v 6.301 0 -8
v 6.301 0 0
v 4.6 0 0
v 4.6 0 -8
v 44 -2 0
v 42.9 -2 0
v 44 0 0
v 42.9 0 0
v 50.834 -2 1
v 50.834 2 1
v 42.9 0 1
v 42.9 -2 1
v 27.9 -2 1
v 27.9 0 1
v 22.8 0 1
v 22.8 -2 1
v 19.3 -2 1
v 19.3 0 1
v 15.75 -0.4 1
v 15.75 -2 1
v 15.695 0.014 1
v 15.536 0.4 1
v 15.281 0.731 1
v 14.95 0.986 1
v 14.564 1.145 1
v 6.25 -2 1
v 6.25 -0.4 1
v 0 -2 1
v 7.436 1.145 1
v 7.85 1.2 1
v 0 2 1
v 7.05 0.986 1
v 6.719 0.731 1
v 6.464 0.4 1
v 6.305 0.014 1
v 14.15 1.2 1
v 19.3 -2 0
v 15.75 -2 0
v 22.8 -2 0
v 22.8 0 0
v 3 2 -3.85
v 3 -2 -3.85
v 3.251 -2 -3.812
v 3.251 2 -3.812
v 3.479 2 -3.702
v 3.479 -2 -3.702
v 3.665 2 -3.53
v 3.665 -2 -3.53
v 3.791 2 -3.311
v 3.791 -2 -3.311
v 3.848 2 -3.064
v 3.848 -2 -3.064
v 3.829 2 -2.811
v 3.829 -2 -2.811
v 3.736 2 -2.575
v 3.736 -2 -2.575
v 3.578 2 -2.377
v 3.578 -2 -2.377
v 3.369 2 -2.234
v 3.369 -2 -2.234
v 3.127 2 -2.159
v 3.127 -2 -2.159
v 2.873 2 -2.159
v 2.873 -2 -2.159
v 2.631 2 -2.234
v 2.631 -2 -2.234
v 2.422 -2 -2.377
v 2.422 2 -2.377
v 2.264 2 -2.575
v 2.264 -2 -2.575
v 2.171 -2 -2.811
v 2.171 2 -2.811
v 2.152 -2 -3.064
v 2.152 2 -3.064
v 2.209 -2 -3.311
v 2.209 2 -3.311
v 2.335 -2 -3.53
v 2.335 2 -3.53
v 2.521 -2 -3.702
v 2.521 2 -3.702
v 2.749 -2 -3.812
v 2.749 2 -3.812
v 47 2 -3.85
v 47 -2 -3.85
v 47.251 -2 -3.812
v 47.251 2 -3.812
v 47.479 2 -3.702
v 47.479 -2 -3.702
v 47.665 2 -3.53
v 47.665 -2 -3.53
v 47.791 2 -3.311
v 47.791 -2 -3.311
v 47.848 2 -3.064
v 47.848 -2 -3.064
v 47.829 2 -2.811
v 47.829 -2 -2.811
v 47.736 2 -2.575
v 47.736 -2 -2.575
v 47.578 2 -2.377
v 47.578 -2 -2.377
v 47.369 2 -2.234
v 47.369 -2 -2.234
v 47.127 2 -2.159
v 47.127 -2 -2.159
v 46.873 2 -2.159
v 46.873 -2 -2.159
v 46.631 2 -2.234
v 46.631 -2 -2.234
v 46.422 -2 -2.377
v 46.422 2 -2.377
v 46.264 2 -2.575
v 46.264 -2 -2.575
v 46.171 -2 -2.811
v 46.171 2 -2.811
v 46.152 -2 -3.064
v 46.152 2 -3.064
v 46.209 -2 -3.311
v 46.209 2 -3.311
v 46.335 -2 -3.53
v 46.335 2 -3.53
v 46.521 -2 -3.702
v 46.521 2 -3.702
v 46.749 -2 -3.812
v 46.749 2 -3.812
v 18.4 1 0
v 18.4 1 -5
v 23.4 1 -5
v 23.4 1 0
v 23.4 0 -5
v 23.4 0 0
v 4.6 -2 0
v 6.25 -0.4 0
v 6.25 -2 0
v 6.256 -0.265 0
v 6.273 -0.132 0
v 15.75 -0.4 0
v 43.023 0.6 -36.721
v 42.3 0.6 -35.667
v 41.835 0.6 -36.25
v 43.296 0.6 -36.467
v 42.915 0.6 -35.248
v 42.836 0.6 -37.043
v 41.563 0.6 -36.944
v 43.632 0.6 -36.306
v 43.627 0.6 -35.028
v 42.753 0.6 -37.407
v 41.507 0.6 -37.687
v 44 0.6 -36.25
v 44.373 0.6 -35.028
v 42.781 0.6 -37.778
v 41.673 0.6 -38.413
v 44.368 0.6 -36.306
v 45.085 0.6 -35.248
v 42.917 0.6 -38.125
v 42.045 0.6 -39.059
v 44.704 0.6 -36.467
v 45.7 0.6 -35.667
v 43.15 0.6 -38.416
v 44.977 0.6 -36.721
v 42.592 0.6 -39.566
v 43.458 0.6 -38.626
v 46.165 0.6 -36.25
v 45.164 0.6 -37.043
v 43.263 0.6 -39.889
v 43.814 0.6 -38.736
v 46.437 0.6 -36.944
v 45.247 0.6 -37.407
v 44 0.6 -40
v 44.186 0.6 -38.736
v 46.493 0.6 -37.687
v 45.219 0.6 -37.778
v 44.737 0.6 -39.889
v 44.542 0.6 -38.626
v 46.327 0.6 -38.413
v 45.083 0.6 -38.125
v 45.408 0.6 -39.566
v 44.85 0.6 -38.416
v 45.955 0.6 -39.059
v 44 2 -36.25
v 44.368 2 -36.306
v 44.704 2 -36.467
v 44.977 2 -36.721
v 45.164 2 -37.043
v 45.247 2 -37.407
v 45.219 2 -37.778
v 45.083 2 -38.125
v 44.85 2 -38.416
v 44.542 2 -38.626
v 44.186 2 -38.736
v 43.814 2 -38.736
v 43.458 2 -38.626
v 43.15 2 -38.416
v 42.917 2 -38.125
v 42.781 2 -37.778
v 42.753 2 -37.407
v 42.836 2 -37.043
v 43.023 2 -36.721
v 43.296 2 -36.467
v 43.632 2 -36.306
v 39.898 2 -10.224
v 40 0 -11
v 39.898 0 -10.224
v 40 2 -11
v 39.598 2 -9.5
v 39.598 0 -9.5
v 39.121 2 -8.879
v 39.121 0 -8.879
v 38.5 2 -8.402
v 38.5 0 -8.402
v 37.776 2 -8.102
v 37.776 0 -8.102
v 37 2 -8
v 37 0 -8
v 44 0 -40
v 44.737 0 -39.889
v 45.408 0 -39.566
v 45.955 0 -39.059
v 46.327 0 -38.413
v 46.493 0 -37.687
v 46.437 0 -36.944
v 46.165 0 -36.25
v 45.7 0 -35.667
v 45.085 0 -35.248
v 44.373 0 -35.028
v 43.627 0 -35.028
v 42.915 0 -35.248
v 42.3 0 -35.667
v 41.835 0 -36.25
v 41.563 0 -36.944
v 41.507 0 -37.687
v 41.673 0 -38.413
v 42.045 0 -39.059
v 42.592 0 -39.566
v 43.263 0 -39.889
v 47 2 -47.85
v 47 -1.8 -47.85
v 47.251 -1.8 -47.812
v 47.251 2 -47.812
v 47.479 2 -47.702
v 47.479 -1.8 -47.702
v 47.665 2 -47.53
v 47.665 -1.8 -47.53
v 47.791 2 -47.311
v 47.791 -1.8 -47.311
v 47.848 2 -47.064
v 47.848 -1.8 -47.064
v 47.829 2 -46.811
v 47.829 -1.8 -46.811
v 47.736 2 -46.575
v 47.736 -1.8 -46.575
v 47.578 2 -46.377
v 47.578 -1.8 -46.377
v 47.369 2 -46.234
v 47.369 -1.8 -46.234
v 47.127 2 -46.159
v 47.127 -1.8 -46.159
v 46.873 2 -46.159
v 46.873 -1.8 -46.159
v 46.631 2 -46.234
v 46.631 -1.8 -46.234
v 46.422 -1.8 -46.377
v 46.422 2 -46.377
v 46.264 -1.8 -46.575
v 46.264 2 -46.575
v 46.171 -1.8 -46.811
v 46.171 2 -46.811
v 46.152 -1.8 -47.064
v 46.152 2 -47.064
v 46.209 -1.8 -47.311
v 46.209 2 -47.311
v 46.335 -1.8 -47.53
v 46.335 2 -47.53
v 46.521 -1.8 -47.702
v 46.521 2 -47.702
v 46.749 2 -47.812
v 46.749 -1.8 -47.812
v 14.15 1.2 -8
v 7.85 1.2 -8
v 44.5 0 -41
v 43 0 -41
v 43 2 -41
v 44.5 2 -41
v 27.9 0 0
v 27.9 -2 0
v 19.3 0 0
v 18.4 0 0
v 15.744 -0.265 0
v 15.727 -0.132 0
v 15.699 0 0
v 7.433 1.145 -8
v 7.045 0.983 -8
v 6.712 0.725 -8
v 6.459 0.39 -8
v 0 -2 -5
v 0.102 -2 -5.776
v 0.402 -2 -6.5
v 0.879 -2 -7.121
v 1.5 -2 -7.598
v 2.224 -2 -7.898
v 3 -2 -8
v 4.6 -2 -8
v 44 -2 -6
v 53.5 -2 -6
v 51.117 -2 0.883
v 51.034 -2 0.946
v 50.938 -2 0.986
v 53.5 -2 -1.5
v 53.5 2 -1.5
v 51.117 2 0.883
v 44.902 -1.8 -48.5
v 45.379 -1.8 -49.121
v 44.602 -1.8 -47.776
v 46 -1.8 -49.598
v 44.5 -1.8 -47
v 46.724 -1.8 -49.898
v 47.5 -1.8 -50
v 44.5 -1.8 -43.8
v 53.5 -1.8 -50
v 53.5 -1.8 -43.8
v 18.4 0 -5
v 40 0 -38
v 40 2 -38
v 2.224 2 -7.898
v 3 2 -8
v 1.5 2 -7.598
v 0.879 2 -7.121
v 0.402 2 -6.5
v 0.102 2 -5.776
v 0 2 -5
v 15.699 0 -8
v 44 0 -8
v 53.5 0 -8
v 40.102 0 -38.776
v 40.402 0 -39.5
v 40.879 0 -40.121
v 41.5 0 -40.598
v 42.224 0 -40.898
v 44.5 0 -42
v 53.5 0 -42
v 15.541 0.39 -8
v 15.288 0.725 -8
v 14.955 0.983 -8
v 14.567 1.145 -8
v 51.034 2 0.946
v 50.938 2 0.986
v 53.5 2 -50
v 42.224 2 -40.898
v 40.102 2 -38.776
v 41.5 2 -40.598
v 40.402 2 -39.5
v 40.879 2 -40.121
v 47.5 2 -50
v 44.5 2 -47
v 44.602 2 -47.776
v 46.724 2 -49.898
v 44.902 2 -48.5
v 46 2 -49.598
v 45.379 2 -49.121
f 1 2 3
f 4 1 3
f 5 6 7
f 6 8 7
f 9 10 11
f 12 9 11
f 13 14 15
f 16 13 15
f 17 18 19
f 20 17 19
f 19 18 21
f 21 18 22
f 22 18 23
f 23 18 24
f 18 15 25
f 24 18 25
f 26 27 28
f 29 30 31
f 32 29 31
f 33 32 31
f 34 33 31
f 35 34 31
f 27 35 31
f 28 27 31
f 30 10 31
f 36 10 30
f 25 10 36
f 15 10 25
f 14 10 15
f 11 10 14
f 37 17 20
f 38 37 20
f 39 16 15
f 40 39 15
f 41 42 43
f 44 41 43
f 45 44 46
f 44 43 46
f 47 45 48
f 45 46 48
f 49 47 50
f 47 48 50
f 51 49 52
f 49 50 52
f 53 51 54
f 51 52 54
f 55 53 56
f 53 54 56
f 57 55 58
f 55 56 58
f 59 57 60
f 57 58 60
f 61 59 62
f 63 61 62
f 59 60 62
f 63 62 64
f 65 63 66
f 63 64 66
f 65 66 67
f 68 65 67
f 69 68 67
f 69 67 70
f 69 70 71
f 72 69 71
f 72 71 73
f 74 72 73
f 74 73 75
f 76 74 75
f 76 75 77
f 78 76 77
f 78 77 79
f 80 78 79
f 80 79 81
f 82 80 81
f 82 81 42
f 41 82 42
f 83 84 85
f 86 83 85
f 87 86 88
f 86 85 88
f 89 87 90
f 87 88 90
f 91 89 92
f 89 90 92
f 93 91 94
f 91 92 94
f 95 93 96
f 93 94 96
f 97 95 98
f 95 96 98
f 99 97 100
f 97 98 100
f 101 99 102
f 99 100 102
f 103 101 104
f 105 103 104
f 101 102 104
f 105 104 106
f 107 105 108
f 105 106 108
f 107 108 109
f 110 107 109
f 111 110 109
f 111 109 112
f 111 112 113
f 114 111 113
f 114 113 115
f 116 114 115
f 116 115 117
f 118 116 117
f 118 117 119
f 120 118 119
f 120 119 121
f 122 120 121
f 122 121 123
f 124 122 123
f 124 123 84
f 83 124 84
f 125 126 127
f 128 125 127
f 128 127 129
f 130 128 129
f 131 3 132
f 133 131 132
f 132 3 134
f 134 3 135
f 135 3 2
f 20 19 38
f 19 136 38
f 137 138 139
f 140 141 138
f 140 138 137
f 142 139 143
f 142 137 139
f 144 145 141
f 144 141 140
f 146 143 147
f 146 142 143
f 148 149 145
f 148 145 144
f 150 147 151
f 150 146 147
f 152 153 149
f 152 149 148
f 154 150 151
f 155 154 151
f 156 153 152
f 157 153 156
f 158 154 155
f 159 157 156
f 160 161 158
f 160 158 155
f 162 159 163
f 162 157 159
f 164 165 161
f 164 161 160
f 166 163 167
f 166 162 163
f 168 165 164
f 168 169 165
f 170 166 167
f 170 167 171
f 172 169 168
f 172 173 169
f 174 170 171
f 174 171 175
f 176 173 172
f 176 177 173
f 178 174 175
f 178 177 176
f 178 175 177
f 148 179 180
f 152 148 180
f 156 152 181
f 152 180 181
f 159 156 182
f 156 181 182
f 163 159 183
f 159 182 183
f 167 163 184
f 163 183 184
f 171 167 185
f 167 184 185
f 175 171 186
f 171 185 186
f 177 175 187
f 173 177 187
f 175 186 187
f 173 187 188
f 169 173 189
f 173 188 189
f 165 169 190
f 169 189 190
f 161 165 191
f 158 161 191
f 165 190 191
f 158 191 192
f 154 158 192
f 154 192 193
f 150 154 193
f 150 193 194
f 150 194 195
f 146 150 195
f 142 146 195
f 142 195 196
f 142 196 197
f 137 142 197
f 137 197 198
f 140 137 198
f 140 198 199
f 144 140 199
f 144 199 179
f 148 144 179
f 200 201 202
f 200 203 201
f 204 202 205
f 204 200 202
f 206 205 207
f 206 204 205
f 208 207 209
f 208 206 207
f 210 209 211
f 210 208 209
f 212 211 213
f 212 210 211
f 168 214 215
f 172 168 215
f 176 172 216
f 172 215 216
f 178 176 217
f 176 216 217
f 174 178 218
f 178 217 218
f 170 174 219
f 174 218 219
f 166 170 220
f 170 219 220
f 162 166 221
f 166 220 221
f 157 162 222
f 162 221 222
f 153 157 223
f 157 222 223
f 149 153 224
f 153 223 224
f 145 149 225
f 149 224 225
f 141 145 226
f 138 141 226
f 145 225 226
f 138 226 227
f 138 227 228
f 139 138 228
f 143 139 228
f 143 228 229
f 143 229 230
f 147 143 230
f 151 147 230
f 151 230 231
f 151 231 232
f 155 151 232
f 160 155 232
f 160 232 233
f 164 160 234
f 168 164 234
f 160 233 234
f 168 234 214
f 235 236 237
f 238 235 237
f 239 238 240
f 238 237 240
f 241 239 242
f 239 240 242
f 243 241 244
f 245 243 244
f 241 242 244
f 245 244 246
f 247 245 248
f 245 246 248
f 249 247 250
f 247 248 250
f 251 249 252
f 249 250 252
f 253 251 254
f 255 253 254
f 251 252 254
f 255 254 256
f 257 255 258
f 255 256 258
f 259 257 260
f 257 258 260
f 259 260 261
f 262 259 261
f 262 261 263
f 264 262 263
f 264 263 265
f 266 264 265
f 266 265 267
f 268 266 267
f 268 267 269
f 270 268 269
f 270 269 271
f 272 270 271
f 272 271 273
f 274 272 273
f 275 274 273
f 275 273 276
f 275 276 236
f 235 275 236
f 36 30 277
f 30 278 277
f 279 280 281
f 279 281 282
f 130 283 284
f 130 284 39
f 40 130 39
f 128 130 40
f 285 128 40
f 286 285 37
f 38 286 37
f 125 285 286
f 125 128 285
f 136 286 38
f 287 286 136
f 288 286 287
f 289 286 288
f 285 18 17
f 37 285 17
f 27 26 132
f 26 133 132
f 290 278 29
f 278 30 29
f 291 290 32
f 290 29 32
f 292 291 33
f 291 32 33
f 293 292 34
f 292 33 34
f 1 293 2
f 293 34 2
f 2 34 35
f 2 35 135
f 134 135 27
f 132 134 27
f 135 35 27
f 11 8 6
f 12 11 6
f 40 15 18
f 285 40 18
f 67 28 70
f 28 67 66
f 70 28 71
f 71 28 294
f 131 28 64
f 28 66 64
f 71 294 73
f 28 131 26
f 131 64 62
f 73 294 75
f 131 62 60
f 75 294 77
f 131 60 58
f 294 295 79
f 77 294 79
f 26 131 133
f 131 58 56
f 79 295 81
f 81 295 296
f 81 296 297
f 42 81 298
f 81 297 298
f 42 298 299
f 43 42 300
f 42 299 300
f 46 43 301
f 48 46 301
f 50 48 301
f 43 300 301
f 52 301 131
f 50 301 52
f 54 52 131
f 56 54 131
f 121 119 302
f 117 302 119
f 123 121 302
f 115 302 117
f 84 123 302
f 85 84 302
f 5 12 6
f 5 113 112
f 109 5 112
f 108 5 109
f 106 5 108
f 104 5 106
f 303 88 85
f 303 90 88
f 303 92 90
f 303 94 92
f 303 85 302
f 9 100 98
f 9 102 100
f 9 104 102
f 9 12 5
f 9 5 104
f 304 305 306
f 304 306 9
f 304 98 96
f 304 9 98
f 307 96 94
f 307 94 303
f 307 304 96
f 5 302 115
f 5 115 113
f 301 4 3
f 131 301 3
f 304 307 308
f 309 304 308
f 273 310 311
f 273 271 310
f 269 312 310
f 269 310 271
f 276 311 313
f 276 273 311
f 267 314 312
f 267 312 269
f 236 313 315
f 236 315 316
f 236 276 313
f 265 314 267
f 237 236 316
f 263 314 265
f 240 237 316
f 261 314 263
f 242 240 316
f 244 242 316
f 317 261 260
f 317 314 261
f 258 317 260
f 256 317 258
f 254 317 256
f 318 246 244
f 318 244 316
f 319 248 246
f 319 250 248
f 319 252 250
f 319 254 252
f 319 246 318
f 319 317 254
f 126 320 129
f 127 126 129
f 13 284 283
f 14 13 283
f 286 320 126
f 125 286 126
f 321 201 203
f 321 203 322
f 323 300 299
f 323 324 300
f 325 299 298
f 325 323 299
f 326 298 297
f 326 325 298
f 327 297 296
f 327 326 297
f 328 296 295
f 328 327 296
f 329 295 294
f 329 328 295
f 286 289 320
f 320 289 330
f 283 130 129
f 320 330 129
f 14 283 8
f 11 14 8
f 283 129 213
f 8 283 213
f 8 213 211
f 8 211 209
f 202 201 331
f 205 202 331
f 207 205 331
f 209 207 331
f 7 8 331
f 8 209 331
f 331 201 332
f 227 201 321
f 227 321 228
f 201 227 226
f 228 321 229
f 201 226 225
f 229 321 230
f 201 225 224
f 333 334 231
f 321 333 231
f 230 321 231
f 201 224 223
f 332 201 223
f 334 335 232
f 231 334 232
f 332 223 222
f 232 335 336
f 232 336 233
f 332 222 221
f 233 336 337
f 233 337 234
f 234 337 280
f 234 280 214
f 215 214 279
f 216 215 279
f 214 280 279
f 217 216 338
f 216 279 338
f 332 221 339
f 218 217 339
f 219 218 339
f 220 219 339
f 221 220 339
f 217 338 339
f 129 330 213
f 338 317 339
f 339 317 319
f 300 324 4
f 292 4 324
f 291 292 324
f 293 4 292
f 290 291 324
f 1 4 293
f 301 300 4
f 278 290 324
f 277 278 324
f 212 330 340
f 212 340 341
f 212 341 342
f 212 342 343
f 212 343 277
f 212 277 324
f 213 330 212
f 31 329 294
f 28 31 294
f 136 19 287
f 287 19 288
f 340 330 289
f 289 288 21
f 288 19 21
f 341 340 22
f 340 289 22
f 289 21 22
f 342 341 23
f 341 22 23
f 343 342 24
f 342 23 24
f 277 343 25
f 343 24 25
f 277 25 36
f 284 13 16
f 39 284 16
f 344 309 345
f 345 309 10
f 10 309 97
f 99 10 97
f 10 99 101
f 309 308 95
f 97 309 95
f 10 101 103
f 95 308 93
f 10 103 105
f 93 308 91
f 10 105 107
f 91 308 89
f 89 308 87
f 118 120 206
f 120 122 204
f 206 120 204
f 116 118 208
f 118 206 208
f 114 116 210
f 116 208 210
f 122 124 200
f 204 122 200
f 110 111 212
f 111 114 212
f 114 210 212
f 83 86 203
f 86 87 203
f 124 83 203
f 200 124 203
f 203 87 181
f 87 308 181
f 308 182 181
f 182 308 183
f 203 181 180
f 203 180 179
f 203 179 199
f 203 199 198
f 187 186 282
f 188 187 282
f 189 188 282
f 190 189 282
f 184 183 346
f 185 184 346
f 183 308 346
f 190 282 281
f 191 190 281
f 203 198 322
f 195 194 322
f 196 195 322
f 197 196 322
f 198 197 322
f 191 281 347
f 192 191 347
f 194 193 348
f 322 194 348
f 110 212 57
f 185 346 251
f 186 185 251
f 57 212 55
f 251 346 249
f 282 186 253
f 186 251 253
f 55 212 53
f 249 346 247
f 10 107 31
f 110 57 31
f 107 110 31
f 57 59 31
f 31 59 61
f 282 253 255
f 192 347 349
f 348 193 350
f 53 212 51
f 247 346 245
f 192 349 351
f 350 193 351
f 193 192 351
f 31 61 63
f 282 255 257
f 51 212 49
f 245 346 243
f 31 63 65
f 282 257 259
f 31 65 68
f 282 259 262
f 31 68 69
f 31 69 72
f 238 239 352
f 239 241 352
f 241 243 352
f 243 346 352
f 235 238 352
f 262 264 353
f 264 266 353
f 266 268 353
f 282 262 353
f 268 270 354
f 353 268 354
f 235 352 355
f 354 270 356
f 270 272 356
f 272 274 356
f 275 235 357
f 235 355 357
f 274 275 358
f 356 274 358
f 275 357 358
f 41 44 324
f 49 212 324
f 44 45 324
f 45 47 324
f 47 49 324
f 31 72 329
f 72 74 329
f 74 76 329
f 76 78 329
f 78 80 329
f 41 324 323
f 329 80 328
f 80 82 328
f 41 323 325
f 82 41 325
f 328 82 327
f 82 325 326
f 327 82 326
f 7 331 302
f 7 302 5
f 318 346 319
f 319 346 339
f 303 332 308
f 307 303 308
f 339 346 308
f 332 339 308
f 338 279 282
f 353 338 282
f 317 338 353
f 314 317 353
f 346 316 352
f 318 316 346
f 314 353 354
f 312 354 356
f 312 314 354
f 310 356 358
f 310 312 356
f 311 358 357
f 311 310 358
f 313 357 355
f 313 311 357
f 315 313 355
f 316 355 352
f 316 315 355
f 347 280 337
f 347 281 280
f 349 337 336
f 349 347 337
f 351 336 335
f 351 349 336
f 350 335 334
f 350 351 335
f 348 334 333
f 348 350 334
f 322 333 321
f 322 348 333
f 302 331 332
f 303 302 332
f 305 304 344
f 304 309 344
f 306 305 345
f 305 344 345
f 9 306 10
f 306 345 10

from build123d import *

# Parameters (mm, degrees)
EXTRUDE_1_DEPTH     = 2
SKETCH_3_W          = 9.5
SKETCH_3_H          = 8
CUT_EXTRUDE_1_DEPTH = 1.2
SKETCH_4_W          = 5
SKETCH_4_H          = 5
CUT_EXTRUDE_2_DEPTH = 1
EXTRUDE_2_DEPTH     = 1
FILLET_1_R          = 1.6
SKETCH_6_W          = 9.5
SKETCH_6_H          = 6
SKETCH_6_W_2        = 9
SKETCH_6_W_3        = 4.6
SKETCH_6_H_2        = 8
EXTRUDE_3_DEPTH     = 2
CHAMFER_1_SIZE      = 2.5
CHAMFER_2_SIZE      = 2
FILLET_2_R          = 3
SKETCH_7_R          = 0.85
CUT_EXTRUDE_3_DEPTH = 74.33655296
SKETCH_8_R          = 1.25
CUT_EXTRUDE_4_DEPTH = 74.33655296
SKETCH_9_R          = 2.5
CUT_EXTRUDE_5_DEPTH = 0.6
FILLET_3_R          = 0.4
SKETCH_10_W         = 12.125863774
SKETCH_10_H         = 8.335254798
CUT_EXTRUDE_6_DEPTH = 0.2
EXTRUDE_4_DEPTH     = 1


with BuildPart() as part:
    # 草图2 → 凸台-拉伸1 (new body)
    with BuildSketch(Plane(origin=(0, 0, 0), x_dir=(1, 0, 0), z_dir=(0, 1, 0))):
        Polygon((40, 41), (44.5, 41), (44.5, 50), (53.5, 50), (53.5, 0), (0, 0), (0, 8), (40, 8), align=None)
    extrude(amount=EXTRUDE_1_DEPTH)

    # 草图3 → 切除-拉伸1 (cut)
    with BuildSketch(Plane.XZ):
        with Locations((11, -4)):
            Rectangle(SKETCH_3_W, SKETCH_3_H)
    extrude(amount=-CUT_EXTRUDE_1_DEPTH, mode=Mode.SUBTRACT)

    # 草图4 → 切除-拉伸2 (cut)
    with BuildSketch(Plane.XZ):
        with Locations((20.9, -2.5)):
            Rectangle(SKETCH_4_W, SKETCH_4_H)
    extrude(amount=-CUT_EXTRUDE_2_DEPTH, mode=Mode.SUBTRACT)

    # 草图5 → 凸台-拉伸2 (add)
    with BuildSketch(Plane.XY):
        Polygon((0, 0), (0, -2), (6.25, -2), (6.25, 0), (6.25, 1.2), (15.75, 1.2), (15.75, -2), (18.4, -2), (18.4, 1), (23.4, 1), (23.4, 0), (23.4, -2), (27.9, -2), (27.9, 0), (42.9, 0), (42.9, -2), (53.5, -2), (53.5, 0), (53.5, 2), (0, 2), align=None)
    extrude(amount=EXTRUDE_2_DEPTH)

    # 圆角1
    fillet_1_edges = [part.edges().sort_by_distance(p)[0] for p in [
        (15.75, 1.2, -3.5),
        (6.25, 1.2, -3.5),
    ]]
    fillet(fillet_1_edges, radius=FILLET_1_R)

    # 草图6 → 凸台-拉伸3 (add)
    with BuildSketch(Plane.XZ):
        with Locations((48.75, -3)):
            Rectangle(SKETCH_6_W, SKETCH_6_H)
        with Locations((49, -47)):
            Rectangle(SKETCH_6_W_2, SKETCH_6_H)
        with Locations((2.3, -4)):
            Rectangle(SKETCH_6_W_3, SKETCH_6_H_2)
    extrude(amount=EXTRUDE_3_DEPTH)

    # 倒角1
    chamfer_1_edges = [part.edges().sort_by_distance(p)[0] for p in [
        (53.5, 0, 1),
    ]]
    chamfer(chamfer_1_edges, length=CHAMFER_1_SIZE)

    # 倒角2
    chamfer_2_edges = [part.edges().sort_by_distance(p)[0] for p in [
        (48.75, 0, -6),
        (49, 0, -44),
    ]]
    chamfer(chamfer_2_edges, length=CHAMFER_2_SIZE - 0.0001)  # a hair under: the kernel refuses the full size

    # 圆角2
    fillet_2_edges = [part.edges().sort_by_distance(p)[0] for p in [
        (0, 0, -8),
        (40, 1, -8),
        (40, 1, -41),
        (44.5, 0, -50),
    ]]
    fillet(fillet_2_edges, radius=FILLET_2_R)

    # 草图7 → 切除-拉伸3 (cut, through all)
    with BuildSketch(Plane.XZ.offset(2)):
        with Locations(Location((47, -3, 0), (0, 0, 270))):
            Circle(SKETCH_7_R)
        with Locations(Location((47, -47, 0), (0, 0, 270))):
            Circle(SKETCH_7_R)
        with Locations(Location((3, -3, 0), (0, 0, 270))):
            Circle(SKETCH_7_R)
    extrude(amount=-CUT_EXTRUDE_3_DEPTH, mode=Mode.SUBTRACT)

    # 草图8 → 切除-拉伸4 (cut, through all)
    with BuildSketch(Plane(origin=(0, 2, 0), x_dir=(1, 0, 0), z_dir=(0, 1, 0))):
        with Locations(Location((44, 37.5, 0), (0, 0, 270))):
            Circle(SKETCH_8_R)
    extrude(amount=-CUT_EXTRUDE_4_DEPTH, mode=Mode.SUBTRACT)

    # 草图9 → 切除-拉伸5 (cut)
    with BuildSketch(Plane.XZ):
        with Locations(Location((44, -37.5, 0), (0, 0, 270))):
            Circle(SKETCH_9_R)
    extrude(amount=-CUT_EXTRUDE_5_DEPTH, mode=Mode.SUBTRACT)

    # 圆角3
    fillet_3_edges = [part.edges().sort_by_distance(p)[0] for p in [
        (51, 0, 1),
    ]]
    fillet(fillet_3_edges, radius=FILLET_3_R)

    # 草图10 → 切除-拉伸6 (cut)
    with BuildSketch(Plane.XZ.offset(2)):
        with Locations((49.021088356, -47.204499244)):
            Rectangle(SKETCH_10_W, SKETCH_10_H)
    extrude(amount=-CUT_EXTRUDE_6_DEPTH, mode=Mode.SUBTRACT)

    # 草图11 → 凸台-拉伸4 (add)
    with BuildSketch(Plane.XY.offset(1)):
        Polygon((23.4, 1), (23.4, -2), (22.8, -2), (22.8, 0), (19.3, 0), (19.3, -2), (18.4, -2), (18.4, 1), align=None)
    extrude(amount=-EXTRUDE_4_DEPTH)


solid = part.part
